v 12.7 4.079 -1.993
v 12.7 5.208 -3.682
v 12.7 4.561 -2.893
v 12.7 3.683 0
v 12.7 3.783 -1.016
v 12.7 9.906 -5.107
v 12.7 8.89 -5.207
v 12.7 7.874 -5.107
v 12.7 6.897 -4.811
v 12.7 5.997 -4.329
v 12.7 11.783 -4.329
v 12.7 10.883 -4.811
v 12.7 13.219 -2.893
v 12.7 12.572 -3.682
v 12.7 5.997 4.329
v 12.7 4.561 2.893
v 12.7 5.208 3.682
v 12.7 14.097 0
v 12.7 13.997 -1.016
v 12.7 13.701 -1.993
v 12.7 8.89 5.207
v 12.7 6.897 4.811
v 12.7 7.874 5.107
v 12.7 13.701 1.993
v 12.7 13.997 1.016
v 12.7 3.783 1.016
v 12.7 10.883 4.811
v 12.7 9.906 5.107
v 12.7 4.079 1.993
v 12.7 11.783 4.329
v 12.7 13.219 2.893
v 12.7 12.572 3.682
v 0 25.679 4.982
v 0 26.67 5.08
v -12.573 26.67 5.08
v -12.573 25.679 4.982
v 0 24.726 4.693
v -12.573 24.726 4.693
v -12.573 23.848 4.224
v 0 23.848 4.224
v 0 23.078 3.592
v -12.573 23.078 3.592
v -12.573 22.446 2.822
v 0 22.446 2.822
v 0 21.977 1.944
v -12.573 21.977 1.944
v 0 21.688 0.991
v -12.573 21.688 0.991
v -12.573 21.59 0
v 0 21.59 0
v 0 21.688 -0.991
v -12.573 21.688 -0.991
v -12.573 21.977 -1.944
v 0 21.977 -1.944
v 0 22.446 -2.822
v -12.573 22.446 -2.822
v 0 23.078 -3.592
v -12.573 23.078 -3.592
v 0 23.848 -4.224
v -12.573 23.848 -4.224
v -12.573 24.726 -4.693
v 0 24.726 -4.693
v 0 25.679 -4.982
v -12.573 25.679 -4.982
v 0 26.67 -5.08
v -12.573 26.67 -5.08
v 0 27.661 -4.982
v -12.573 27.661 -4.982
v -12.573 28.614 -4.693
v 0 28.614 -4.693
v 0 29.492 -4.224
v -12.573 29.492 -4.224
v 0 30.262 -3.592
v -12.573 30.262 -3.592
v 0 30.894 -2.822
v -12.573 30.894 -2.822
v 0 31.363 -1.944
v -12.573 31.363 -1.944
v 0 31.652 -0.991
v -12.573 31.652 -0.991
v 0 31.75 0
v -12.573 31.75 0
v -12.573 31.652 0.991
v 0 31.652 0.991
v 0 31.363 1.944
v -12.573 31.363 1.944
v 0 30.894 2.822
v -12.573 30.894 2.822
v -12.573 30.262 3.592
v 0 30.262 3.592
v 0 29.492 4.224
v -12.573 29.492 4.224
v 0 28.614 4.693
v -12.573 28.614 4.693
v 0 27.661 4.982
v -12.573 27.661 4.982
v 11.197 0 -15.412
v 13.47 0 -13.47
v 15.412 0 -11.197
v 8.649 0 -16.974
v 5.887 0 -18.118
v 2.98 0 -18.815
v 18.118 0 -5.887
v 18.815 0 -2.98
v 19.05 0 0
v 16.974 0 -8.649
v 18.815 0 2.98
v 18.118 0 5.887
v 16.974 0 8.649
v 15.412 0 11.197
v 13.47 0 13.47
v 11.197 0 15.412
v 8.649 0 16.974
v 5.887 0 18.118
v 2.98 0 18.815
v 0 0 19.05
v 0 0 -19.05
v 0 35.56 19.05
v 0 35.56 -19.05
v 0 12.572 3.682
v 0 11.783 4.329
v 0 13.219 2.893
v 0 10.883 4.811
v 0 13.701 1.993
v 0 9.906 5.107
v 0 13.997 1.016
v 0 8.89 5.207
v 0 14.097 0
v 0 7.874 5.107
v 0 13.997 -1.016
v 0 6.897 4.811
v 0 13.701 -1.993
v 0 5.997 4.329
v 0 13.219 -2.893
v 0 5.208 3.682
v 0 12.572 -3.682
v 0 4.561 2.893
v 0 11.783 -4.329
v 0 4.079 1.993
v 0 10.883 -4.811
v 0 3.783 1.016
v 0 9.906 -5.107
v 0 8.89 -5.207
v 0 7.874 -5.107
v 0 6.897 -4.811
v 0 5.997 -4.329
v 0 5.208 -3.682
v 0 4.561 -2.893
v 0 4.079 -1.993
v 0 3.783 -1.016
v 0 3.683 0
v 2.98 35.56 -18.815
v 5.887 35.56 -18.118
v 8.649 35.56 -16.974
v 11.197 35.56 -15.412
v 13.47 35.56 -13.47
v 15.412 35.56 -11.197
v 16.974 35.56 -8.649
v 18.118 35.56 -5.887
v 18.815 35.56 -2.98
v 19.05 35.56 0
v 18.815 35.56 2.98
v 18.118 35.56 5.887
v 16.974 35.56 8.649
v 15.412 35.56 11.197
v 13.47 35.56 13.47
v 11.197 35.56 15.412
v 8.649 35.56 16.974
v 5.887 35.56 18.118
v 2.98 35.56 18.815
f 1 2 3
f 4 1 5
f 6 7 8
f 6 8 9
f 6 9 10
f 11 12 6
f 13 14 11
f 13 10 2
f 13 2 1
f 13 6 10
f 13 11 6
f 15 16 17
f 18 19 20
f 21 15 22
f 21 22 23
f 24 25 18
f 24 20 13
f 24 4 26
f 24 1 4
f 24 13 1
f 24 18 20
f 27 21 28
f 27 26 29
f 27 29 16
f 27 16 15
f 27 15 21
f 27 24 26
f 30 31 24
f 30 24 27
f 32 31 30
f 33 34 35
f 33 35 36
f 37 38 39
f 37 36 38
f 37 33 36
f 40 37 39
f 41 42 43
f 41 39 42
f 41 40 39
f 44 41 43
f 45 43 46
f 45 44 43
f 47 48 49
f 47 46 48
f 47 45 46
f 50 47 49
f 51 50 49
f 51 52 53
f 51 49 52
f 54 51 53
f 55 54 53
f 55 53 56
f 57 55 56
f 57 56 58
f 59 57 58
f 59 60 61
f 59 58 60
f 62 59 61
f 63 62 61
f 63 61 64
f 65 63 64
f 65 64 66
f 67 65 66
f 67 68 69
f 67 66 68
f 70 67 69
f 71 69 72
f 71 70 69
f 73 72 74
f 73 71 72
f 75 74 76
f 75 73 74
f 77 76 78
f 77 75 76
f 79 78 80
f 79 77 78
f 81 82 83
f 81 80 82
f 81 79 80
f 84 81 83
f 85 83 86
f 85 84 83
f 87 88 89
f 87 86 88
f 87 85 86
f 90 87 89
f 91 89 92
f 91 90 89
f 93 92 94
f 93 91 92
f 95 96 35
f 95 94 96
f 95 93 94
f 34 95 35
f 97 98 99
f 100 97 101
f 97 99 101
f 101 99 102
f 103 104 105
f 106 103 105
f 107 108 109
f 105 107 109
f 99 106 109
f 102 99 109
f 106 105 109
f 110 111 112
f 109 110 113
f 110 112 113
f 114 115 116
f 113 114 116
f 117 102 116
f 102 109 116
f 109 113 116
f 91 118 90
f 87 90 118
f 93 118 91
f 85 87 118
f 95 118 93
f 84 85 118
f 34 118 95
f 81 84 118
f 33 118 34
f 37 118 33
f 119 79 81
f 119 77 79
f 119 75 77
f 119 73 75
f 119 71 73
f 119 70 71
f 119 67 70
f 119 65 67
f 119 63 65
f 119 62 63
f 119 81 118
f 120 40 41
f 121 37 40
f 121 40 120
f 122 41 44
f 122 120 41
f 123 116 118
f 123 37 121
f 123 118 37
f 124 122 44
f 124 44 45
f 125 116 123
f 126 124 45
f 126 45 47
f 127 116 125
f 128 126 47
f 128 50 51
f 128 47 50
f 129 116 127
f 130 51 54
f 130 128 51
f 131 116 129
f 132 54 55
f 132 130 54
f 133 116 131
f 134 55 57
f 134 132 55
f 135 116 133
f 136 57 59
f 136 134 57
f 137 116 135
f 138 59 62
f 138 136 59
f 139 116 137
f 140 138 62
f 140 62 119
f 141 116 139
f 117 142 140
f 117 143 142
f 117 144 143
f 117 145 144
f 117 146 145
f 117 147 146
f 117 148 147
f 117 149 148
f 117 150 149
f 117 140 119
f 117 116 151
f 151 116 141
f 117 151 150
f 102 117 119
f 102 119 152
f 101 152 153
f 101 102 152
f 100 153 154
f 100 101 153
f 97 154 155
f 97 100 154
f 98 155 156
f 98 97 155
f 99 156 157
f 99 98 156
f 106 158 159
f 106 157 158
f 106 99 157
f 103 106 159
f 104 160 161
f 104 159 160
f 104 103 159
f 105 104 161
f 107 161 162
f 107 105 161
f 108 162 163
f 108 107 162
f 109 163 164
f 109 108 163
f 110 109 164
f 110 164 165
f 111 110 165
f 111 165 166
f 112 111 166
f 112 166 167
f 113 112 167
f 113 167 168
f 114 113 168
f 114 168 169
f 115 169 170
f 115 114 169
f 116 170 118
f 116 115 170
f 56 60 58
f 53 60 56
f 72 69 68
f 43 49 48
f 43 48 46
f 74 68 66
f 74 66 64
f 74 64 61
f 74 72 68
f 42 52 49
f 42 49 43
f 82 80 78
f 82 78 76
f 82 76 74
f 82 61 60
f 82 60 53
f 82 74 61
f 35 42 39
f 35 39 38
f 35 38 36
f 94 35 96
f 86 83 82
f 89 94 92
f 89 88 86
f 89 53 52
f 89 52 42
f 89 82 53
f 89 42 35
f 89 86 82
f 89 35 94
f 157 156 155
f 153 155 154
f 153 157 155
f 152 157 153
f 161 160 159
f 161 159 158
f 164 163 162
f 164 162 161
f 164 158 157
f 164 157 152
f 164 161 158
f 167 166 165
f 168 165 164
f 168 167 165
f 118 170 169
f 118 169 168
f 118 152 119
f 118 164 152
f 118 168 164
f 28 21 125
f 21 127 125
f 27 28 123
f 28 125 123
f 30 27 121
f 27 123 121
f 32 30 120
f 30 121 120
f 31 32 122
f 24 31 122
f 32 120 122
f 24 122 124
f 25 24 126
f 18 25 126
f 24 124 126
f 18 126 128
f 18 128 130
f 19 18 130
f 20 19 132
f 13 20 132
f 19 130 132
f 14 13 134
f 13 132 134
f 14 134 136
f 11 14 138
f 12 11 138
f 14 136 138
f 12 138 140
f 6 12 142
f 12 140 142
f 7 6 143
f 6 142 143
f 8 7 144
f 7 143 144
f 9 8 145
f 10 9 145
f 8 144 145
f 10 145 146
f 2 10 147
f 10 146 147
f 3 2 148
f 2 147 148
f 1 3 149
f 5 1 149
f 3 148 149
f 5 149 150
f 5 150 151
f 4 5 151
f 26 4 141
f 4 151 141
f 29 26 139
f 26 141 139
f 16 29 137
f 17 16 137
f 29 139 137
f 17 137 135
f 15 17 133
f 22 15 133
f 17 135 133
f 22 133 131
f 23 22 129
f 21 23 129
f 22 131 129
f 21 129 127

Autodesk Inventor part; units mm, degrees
ref_plane "YZ Plane" through (0, 0, 0) normal (1, 0, 0) x (0, 1, 0)
ref_plane "XZ Plane" through (0, 0, 0) normal (0, 1, 0) x (-1, 0, 0)
ref_plane "XY Plane" through (0, 0, 0) normal (0, 0, 1) x (1, 0, 0)
sketch "Sketch1" plane through (0, 0, 0) normal (0, 1, 0) x (-1, 0, 0)
  arc A0 (0, 19.05) -> (0, -19.05) centre (0, 0) ccw
  line L0 (0, 19.05) -> (0, -19.05)
  dimension "d0" = 38.1
extrude "Extrusion1" add sketch "Sketch1" along normal blind 35.56
sketch "Sketch2" plane through (0, 0, -19.05) normal (-1, 0, 0) x (0, 0, 1)
  line L0 (0, 35.56) -> (38.1, 35.56) projected
  line L1 (0, 0) -> (0, 35.56) projected
  circle A0 centre (19.05, 26.67) radius 5.08
  circle A1 centre (19.05, 8.89) radius 5.207
  point P0 (19.05, 0)
  dimension "d6" = 10.414
extrude "Extrusion2" cut sketch "Sketch2" against normal blind 12.7 contours A1
extrude "Extrusion3" add sketch "Sketch2" along normal blind 12.573 contours A0
properties part number "Piston Mold"
